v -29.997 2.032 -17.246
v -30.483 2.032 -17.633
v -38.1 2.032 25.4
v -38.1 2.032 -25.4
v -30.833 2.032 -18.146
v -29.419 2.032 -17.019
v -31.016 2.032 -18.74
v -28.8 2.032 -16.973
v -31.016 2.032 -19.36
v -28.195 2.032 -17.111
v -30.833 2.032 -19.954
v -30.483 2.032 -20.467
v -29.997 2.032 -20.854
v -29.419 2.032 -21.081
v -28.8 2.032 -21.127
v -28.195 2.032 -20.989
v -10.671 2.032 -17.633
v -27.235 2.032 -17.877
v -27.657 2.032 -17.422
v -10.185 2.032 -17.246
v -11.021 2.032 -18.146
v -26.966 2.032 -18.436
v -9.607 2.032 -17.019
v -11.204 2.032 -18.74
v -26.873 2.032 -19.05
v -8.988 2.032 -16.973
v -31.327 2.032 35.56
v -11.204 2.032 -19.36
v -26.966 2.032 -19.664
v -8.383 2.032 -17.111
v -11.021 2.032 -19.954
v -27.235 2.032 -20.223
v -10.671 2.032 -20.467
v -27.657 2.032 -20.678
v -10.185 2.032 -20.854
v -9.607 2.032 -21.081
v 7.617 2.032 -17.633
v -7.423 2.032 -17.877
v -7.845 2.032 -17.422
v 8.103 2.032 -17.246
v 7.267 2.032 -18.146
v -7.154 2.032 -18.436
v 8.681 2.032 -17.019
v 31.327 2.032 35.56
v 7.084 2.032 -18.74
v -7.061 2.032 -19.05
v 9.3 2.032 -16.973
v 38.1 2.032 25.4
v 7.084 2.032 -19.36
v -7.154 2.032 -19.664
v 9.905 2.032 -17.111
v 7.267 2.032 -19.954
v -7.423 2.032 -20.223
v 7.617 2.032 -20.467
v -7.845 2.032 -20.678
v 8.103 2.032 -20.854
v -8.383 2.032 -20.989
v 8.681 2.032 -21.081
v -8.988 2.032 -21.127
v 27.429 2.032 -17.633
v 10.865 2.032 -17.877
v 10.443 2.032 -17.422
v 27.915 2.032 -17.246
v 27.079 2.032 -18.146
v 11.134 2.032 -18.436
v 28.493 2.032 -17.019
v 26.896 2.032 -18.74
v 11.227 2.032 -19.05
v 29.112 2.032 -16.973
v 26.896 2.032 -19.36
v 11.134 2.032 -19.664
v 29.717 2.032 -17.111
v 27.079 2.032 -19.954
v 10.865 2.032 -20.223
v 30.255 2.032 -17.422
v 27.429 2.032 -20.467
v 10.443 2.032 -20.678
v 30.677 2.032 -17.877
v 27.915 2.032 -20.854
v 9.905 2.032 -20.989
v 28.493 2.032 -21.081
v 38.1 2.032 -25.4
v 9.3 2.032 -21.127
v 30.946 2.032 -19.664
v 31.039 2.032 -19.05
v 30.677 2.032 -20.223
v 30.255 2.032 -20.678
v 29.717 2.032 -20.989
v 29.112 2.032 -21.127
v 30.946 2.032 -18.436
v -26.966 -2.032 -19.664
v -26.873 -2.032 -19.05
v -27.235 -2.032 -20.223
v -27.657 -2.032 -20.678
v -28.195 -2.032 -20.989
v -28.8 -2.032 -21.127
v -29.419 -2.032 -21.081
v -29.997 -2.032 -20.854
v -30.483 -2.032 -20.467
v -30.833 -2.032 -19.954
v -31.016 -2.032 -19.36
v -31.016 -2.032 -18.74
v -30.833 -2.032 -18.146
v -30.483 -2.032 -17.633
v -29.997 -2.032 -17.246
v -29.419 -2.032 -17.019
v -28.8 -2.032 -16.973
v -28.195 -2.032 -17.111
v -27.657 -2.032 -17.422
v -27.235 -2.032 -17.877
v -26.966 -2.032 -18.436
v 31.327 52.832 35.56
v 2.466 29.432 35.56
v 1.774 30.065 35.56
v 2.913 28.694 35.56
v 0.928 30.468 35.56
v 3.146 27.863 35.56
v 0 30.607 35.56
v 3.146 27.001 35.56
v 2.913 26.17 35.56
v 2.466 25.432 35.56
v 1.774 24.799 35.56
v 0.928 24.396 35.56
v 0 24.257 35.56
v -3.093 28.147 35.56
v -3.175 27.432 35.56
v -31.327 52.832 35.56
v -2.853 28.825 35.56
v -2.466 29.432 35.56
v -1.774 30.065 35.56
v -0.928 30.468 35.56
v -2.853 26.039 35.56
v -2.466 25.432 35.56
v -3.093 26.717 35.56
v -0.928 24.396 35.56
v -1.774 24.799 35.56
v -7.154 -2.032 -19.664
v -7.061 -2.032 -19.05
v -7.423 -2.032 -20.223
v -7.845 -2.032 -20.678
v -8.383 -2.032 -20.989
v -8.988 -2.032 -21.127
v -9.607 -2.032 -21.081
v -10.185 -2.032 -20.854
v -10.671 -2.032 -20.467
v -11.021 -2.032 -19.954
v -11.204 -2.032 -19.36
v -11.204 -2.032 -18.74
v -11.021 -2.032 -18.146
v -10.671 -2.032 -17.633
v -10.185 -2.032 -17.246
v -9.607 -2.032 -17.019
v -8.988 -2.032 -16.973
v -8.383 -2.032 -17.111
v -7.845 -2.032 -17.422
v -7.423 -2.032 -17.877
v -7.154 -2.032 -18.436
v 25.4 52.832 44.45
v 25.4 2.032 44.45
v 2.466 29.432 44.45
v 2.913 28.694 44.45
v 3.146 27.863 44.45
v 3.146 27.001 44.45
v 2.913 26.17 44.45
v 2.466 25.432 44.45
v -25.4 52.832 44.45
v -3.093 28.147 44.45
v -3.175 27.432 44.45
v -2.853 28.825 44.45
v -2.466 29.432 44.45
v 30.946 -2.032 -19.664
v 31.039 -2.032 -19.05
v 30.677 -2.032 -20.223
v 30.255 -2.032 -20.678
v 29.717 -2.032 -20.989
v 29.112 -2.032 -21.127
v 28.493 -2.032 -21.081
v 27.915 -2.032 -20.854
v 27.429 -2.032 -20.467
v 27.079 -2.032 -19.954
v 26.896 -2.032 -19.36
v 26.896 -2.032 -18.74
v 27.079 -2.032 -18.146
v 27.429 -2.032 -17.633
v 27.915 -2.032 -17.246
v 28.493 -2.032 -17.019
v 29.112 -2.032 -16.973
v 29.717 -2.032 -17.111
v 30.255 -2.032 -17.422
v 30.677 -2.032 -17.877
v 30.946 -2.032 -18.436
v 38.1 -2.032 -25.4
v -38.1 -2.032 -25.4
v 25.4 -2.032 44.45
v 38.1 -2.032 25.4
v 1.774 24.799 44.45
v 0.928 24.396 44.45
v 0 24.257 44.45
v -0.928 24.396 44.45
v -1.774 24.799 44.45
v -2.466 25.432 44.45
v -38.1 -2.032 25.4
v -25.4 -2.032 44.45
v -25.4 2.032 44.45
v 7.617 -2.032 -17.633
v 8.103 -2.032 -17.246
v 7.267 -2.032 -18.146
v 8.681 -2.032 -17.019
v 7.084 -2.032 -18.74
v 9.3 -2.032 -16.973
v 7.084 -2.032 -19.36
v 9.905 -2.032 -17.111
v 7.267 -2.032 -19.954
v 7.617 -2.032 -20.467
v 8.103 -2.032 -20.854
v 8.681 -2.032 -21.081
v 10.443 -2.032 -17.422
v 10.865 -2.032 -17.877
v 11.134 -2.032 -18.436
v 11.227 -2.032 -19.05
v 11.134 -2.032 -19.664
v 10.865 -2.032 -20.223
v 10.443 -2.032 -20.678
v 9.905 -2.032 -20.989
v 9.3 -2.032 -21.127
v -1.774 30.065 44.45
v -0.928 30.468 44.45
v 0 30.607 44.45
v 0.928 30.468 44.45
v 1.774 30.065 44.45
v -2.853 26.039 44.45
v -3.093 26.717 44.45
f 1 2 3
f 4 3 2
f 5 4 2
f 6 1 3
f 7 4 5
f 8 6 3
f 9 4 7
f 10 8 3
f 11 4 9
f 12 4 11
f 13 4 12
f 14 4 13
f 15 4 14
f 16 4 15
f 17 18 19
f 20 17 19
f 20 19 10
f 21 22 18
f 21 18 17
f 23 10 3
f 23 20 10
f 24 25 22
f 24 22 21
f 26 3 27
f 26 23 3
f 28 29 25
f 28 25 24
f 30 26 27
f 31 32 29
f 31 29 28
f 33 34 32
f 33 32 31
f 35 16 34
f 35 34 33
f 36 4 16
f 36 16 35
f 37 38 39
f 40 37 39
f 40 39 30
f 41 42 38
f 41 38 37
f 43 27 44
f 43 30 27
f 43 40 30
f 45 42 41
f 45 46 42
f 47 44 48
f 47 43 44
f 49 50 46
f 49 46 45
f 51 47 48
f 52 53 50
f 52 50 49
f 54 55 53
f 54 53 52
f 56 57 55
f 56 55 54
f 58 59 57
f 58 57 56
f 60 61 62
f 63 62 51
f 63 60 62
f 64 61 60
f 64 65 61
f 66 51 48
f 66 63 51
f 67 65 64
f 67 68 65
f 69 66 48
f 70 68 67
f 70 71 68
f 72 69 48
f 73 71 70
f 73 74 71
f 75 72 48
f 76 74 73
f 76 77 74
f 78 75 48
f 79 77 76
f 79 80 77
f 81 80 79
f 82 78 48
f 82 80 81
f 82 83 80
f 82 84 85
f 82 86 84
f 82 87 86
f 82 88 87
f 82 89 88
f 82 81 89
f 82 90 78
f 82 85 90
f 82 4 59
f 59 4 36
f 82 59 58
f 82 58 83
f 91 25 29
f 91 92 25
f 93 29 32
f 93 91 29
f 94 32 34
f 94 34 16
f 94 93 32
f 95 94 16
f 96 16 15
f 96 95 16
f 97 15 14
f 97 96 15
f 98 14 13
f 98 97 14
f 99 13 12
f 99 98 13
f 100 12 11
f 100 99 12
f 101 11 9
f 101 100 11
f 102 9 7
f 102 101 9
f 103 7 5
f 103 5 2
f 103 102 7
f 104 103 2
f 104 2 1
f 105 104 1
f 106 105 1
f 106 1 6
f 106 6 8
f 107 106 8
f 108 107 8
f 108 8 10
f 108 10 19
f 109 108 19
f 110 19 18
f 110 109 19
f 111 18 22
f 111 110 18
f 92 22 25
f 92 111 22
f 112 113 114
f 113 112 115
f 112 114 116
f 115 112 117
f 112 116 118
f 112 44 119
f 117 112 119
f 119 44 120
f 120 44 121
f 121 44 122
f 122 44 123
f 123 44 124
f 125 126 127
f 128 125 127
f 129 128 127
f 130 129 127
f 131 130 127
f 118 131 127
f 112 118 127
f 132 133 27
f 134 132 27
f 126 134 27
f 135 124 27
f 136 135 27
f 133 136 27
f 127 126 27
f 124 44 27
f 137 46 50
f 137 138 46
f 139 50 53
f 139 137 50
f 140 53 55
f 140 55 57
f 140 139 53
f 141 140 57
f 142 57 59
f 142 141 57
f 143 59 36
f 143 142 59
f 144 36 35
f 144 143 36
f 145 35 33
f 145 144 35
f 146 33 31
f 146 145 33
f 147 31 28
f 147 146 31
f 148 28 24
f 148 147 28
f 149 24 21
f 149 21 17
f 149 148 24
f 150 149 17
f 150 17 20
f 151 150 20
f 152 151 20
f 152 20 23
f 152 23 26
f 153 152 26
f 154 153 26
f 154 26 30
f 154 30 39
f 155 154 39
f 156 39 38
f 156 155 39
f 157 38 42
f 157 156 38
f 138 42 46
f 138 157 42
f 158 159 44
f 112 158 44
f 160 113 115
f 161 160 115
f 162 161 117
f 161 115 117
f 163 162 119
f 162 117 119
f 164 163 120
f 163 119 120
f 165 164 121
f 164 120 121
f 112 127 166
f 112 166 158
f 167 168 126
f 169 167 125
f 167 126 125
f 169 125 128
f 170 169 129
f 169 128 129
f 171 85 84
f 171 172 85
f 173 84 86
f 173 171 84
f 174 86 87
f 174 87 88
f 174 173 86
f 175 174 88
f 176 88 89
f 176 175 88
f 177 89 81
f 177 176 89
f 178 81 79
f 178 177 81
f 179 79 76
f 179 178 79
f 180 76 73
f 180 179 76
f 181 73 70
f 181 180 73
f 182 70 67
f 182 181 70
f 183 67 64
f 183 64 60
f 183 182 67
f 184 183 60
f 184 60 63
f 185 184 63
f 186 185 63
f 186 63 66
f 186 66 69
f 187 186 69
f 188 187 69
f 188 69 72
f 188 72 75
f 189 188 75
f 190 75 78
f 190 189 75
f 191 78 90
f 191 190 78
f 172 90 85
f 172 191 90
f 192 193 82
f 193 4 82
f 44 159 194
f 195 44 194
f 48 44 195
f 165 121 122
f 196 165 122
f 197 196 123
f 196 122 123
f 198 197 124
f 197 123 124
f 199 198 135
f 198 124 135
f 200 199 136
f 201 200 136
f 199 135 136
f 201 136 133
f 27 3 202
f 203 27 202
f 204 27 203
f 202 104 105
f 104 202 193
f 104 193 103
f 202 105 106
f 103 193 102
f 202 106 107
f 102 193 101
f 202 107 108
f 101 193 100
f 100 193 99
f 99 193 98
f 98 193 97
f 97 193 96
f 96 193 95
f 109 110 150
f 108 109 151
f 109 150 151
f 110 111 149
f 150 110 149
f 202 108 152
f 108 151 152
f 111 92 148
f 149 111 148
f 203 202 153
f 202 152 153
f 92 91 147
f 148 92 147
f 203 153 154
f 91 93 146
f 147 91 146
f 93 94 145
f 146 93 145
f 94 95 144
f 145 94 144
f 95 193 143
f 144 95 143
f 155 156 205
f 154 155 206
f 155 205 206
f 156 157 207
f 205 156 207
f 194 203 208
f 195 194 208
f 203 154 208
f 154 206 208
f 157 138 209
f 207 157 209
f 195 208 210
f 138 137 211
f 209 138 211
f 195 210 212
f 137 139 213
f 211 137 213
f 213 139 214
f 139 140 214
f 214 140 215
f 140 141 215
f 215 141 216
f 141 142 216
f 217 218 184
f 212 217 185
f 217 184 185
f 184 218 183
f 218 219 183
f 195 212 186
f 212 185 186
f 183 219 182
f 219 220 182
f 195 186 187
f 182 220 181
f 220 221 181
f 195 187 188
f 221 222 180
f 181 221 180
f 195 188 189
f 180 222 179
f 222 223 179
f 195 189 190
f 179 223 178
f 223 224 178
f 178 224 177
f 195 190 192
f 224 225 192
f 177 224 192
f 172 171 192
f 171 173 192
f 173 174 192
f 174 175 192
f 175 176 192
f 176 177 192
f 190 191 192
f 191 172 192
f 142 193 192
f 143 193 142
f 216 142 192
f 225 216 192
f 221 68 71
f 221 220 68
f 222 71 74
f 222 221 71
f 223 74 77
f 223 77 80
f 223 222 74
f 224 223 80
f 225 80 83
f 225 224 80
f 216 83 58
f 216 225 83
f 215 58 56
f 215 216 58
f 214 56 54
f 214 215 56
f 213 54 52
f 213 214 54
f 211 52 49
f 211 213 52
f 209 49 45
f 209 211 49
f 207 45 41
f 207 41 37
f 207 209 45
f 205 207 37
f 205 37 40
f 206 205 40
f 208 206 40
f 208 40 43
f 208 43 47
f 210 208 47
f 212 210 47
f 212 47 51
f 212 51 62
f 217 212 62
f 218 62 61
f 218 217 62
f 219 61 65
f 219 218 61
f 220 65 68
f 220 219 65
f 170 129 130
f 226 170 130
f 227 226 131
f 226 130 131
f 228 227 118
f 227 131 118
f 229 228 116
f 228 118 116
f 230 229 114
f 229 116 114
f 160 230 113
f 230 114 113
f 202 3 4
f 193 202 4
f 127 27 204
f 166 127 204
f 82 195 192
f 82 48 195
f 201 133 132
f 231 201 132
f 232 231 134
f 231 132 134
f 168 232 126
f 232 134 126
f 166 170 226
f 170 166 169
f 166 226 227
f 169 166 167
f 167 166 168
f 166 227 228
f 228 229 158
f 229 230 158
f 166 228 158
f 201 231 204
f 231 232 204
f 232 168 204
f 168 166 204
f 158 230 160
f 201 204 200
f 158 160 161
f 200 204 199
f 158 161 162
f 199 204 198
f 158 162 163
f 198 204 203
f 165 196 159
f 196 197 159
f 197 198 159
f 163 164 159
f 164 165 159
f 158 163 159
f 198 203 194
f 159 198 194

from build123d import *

# Parameters (mm, degrees)
SKETCH1_W           = 76.2
SKETCH1_H           = 50.8
SKETCH1_R           = 2.0828
BOSS_EXTRUDE1_DEPTH = 2.032
BOSS_EXTRUDE2_DEPTH = 50.8
CUT_EXTRUDE1_DEPTH  = 9.89


with BuildPart() as part:
    # Sketch1 → Boss-Extrude1 (new body, symmetric)
    with BuildSketch(Plane(origin=(0, 0, 0), x_dir=(1, 0, 0), z_dir=(0, 1, 0))):
        Rectangle(SKETCH1_W, SKETCH1_H)
        with Locations((28.956, 19.05)):
            Circle(SKETCH1_R, mode=Mode.SUBTRACT)
        with Locations((9.144, 19.05)):
            Circle(SKETCH1_R, mode=Mode.SUBTRACT)
        with Locations((-9.144, 19.05)):
            Circle(SKETCH1_R, mode=Mode.SUBTRACT)
        with Locations((-28.956, 19.05)):
            Circle(SKETCH1_R, mode=Mode.SUBTRACT)
        Polygon((-25.4, -44.45), (25.4, -44.45), (38.1, -25.4), (-38.1, -25.4), align=None)
    extrude(amount=BOSS_EXTRUDE1_DEPTH, both=True)

    # Sketch2 → Boss-Extrude2 (add)
    with BuildSketch(Plane(origin=(0, 2.032, 0), x_dir=(1, 0, 0), z_dir=(0, 1, 0))):
        Polygon((-31.326666667, -35.56), (-25.4, -44.45), (25.4, -44.45), (31.326666667, -35.56), align=None)
    extrude(amount=BOSS_EXTRUDE2_DEPTH)

    # Sketch3 → Cut-Extrude1 (cut, through all)
    with BuildSketch(Plane(origin=(0, 0, 35.56), x_dir=(-1, 0, 0), z_dir=(0, 0, -1))):
        with BuildLine():
            ThreePointArc((-2.466199502, 25.432378782), (0, 24.257), (2.466199502, 25.432378782))
            Line((2.466199502, 25.432378782), (0, 27.432))
            Line((0, 27.432), (-2.466199502, 25.432378782))
        make_face()
        with BuildLine():
            Line((0, 27.432), (2.466199502, 25.432378782))
            ThreePointArc((2.466199502, 25.432378782), (2.992558138, 26.371235752), (3.175, 27.432))
            ThreePointArc((3.175, 27.432), (2.992558138, 28.492764248), (2.466199502, 29.431621218))
            Line((2.466199502, 29.431621218), (0, 27.432))
        make_face()
        with BuildLine():
            Line((-2.466199502, 25.432378782), (0, 27.432))
            Line((0, 27.432), (-2.466199502, 29.431621218))
            ThreePointArc((-2.466199502, 29.431621218), (-3.175, 27.432), (-2.466199502, 25.432378782))
        make_face()
        with BuildLine():
            Line((-2.466199502, 29.431621218), (0, 27.432))
            Line((0, 27.432), (2.466199502, 29.431621218))
            ThreePointArc((2.466199502, 29.431621218), (0, 30.607), (-2.466199502, 29.431621218))
        make_face()
    extrude(amount=-CUT_EXTRUDE1_DEPTH, mode=Mode.SUBTRACT)


solid = part.part
